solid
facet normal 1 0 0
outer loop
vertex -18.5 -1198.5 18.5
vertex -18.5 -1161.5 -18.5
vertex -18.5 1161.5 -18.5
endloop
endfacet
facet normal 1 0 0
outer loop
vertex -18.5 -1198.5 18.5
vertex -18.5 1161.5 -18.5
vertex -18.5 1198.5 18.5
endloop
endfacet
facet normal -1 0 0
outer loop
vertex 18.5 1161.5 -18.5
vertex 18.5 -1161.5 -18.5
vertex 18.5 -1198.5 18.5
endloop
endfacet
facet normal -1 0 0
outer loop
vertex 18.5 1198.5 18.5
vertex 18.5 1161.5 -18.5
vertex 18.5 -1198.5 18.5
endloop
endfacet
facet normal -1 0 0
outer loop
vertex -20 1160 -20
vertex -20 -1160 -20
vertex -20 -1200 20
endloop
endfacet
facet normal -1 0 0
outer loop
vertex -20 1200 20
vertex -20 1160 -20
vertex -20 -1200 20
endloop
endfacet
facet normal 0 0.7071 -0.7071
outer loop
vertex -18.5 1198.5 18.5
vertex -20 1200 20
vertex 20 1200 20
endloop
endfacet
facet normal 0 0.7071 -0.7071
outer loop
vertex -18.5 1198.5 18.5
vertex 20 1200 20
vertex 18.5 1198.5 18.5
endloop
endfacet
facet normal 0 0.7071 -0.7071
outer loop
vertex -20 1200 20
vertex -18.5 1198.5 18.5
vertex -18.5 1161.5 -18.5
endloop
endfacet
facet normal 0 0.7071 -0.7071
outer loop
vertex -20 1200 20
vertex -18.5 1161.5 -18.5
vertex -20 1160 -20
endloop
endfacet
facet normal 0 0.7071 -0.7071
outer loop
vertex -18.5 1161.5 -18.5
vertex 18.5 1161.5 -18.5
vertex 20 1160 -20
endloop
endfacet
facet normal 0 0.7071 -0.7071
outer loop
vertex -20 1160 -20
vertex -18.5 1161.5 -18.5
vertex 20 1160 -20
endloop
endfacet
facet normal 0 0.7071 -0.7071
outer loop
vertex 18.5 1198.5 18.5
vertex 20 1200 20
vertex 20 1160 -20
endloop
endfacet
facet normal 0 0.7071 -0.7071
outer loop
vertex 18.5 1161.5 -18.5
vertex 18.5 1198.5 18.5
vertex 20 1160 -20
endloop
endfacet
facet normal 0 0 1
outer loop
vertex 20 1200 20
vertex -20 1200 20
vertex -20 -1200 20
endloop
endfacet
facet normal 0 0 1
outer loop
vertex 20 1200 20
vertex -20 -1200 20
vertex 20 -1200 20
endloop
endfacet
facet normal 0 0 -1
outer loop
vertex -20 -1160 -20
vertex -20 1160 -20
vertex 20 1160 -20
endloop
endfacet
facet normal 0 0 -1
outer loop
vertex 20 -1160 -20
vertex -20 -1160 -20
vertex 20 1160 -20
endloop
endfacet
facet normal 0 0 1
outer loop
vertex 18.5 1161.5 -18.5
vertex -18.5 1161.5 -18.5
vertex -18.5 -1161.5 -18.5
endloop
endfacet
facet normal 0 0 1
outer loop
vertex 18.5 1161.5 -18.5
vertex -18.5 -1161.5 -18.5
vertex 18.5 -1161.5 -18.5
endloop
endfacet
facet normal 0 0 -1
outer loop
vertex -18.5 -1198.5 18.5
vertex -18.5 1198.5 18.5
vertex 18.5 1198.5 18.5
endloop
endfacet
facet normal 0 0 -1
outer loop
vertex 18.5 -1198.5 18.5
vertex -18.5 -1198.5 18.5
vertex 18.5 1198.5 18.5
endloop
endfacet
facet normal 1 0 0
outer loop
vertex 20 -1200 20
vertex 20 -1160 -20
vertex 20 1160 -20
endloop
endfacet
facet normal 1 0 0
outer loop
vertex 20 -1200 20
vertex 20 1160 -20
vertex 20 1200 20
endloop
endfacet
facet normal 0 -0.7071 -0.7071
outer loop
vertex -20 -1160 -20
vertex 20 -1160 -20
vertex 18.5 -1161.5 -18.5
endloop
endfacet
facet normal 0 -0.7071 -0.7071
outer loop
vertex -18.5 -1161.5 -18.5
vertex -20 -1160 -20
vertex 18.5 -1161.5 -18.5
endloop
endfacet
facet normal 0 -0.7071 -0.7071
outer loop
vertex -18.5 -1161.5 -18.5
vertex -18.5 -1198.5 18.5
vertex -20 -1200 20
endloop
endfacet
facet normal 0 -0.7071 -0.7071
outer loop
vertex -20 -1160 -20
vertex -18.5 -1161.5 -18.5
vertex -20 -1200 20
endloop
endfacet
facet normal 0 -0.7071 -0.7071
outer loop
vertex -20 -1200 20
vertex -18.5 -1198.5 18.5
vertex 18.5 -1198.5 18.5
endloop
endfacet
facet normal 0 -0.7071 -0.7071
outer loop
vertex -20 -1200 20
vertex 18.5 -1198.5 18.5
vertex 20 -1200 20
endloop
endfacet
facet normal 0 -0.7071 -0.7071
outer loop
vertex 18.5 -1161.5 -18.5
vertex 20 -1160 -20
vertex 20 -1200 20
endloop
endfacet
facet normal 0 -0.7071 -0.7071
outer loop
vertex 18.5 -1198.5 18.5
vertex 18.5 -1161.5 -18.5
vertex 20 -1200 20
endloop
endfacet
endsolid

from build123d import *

# Parameters (mm, degrees)
F0_W     = 40
F0_H     = 40
F0_W_2   = 37
F0_H_2   = 37
F1_DEPTH = 1200
F3_DEPTH = 40


with BuildPart() as f1:
    # F0 (on Front) → F1 (new body, symmetric)
    with BuildSketch(Plane.XZ):
        Rectangle(F0_W, F0_H)
        Rectangle(F0_W_2, F0_H_2, mode=Mode.SUBTRACT)
    extrude(amount=F1_DEPTH, both=True)

    # F2 (on face) → F3 (cut)
    with BuildSketch(Plane.YZ.offset(20)):
        Polygon((1200, -20), (1200, 20), (1160, -20), align=None)
        Polygon((-1160, -20), (-1200, 20), (-1200, -20), align=None)
    extrude(amount=-F3_DEPTH, mode=Mode.SUBTRACT)


solid = f1.part
